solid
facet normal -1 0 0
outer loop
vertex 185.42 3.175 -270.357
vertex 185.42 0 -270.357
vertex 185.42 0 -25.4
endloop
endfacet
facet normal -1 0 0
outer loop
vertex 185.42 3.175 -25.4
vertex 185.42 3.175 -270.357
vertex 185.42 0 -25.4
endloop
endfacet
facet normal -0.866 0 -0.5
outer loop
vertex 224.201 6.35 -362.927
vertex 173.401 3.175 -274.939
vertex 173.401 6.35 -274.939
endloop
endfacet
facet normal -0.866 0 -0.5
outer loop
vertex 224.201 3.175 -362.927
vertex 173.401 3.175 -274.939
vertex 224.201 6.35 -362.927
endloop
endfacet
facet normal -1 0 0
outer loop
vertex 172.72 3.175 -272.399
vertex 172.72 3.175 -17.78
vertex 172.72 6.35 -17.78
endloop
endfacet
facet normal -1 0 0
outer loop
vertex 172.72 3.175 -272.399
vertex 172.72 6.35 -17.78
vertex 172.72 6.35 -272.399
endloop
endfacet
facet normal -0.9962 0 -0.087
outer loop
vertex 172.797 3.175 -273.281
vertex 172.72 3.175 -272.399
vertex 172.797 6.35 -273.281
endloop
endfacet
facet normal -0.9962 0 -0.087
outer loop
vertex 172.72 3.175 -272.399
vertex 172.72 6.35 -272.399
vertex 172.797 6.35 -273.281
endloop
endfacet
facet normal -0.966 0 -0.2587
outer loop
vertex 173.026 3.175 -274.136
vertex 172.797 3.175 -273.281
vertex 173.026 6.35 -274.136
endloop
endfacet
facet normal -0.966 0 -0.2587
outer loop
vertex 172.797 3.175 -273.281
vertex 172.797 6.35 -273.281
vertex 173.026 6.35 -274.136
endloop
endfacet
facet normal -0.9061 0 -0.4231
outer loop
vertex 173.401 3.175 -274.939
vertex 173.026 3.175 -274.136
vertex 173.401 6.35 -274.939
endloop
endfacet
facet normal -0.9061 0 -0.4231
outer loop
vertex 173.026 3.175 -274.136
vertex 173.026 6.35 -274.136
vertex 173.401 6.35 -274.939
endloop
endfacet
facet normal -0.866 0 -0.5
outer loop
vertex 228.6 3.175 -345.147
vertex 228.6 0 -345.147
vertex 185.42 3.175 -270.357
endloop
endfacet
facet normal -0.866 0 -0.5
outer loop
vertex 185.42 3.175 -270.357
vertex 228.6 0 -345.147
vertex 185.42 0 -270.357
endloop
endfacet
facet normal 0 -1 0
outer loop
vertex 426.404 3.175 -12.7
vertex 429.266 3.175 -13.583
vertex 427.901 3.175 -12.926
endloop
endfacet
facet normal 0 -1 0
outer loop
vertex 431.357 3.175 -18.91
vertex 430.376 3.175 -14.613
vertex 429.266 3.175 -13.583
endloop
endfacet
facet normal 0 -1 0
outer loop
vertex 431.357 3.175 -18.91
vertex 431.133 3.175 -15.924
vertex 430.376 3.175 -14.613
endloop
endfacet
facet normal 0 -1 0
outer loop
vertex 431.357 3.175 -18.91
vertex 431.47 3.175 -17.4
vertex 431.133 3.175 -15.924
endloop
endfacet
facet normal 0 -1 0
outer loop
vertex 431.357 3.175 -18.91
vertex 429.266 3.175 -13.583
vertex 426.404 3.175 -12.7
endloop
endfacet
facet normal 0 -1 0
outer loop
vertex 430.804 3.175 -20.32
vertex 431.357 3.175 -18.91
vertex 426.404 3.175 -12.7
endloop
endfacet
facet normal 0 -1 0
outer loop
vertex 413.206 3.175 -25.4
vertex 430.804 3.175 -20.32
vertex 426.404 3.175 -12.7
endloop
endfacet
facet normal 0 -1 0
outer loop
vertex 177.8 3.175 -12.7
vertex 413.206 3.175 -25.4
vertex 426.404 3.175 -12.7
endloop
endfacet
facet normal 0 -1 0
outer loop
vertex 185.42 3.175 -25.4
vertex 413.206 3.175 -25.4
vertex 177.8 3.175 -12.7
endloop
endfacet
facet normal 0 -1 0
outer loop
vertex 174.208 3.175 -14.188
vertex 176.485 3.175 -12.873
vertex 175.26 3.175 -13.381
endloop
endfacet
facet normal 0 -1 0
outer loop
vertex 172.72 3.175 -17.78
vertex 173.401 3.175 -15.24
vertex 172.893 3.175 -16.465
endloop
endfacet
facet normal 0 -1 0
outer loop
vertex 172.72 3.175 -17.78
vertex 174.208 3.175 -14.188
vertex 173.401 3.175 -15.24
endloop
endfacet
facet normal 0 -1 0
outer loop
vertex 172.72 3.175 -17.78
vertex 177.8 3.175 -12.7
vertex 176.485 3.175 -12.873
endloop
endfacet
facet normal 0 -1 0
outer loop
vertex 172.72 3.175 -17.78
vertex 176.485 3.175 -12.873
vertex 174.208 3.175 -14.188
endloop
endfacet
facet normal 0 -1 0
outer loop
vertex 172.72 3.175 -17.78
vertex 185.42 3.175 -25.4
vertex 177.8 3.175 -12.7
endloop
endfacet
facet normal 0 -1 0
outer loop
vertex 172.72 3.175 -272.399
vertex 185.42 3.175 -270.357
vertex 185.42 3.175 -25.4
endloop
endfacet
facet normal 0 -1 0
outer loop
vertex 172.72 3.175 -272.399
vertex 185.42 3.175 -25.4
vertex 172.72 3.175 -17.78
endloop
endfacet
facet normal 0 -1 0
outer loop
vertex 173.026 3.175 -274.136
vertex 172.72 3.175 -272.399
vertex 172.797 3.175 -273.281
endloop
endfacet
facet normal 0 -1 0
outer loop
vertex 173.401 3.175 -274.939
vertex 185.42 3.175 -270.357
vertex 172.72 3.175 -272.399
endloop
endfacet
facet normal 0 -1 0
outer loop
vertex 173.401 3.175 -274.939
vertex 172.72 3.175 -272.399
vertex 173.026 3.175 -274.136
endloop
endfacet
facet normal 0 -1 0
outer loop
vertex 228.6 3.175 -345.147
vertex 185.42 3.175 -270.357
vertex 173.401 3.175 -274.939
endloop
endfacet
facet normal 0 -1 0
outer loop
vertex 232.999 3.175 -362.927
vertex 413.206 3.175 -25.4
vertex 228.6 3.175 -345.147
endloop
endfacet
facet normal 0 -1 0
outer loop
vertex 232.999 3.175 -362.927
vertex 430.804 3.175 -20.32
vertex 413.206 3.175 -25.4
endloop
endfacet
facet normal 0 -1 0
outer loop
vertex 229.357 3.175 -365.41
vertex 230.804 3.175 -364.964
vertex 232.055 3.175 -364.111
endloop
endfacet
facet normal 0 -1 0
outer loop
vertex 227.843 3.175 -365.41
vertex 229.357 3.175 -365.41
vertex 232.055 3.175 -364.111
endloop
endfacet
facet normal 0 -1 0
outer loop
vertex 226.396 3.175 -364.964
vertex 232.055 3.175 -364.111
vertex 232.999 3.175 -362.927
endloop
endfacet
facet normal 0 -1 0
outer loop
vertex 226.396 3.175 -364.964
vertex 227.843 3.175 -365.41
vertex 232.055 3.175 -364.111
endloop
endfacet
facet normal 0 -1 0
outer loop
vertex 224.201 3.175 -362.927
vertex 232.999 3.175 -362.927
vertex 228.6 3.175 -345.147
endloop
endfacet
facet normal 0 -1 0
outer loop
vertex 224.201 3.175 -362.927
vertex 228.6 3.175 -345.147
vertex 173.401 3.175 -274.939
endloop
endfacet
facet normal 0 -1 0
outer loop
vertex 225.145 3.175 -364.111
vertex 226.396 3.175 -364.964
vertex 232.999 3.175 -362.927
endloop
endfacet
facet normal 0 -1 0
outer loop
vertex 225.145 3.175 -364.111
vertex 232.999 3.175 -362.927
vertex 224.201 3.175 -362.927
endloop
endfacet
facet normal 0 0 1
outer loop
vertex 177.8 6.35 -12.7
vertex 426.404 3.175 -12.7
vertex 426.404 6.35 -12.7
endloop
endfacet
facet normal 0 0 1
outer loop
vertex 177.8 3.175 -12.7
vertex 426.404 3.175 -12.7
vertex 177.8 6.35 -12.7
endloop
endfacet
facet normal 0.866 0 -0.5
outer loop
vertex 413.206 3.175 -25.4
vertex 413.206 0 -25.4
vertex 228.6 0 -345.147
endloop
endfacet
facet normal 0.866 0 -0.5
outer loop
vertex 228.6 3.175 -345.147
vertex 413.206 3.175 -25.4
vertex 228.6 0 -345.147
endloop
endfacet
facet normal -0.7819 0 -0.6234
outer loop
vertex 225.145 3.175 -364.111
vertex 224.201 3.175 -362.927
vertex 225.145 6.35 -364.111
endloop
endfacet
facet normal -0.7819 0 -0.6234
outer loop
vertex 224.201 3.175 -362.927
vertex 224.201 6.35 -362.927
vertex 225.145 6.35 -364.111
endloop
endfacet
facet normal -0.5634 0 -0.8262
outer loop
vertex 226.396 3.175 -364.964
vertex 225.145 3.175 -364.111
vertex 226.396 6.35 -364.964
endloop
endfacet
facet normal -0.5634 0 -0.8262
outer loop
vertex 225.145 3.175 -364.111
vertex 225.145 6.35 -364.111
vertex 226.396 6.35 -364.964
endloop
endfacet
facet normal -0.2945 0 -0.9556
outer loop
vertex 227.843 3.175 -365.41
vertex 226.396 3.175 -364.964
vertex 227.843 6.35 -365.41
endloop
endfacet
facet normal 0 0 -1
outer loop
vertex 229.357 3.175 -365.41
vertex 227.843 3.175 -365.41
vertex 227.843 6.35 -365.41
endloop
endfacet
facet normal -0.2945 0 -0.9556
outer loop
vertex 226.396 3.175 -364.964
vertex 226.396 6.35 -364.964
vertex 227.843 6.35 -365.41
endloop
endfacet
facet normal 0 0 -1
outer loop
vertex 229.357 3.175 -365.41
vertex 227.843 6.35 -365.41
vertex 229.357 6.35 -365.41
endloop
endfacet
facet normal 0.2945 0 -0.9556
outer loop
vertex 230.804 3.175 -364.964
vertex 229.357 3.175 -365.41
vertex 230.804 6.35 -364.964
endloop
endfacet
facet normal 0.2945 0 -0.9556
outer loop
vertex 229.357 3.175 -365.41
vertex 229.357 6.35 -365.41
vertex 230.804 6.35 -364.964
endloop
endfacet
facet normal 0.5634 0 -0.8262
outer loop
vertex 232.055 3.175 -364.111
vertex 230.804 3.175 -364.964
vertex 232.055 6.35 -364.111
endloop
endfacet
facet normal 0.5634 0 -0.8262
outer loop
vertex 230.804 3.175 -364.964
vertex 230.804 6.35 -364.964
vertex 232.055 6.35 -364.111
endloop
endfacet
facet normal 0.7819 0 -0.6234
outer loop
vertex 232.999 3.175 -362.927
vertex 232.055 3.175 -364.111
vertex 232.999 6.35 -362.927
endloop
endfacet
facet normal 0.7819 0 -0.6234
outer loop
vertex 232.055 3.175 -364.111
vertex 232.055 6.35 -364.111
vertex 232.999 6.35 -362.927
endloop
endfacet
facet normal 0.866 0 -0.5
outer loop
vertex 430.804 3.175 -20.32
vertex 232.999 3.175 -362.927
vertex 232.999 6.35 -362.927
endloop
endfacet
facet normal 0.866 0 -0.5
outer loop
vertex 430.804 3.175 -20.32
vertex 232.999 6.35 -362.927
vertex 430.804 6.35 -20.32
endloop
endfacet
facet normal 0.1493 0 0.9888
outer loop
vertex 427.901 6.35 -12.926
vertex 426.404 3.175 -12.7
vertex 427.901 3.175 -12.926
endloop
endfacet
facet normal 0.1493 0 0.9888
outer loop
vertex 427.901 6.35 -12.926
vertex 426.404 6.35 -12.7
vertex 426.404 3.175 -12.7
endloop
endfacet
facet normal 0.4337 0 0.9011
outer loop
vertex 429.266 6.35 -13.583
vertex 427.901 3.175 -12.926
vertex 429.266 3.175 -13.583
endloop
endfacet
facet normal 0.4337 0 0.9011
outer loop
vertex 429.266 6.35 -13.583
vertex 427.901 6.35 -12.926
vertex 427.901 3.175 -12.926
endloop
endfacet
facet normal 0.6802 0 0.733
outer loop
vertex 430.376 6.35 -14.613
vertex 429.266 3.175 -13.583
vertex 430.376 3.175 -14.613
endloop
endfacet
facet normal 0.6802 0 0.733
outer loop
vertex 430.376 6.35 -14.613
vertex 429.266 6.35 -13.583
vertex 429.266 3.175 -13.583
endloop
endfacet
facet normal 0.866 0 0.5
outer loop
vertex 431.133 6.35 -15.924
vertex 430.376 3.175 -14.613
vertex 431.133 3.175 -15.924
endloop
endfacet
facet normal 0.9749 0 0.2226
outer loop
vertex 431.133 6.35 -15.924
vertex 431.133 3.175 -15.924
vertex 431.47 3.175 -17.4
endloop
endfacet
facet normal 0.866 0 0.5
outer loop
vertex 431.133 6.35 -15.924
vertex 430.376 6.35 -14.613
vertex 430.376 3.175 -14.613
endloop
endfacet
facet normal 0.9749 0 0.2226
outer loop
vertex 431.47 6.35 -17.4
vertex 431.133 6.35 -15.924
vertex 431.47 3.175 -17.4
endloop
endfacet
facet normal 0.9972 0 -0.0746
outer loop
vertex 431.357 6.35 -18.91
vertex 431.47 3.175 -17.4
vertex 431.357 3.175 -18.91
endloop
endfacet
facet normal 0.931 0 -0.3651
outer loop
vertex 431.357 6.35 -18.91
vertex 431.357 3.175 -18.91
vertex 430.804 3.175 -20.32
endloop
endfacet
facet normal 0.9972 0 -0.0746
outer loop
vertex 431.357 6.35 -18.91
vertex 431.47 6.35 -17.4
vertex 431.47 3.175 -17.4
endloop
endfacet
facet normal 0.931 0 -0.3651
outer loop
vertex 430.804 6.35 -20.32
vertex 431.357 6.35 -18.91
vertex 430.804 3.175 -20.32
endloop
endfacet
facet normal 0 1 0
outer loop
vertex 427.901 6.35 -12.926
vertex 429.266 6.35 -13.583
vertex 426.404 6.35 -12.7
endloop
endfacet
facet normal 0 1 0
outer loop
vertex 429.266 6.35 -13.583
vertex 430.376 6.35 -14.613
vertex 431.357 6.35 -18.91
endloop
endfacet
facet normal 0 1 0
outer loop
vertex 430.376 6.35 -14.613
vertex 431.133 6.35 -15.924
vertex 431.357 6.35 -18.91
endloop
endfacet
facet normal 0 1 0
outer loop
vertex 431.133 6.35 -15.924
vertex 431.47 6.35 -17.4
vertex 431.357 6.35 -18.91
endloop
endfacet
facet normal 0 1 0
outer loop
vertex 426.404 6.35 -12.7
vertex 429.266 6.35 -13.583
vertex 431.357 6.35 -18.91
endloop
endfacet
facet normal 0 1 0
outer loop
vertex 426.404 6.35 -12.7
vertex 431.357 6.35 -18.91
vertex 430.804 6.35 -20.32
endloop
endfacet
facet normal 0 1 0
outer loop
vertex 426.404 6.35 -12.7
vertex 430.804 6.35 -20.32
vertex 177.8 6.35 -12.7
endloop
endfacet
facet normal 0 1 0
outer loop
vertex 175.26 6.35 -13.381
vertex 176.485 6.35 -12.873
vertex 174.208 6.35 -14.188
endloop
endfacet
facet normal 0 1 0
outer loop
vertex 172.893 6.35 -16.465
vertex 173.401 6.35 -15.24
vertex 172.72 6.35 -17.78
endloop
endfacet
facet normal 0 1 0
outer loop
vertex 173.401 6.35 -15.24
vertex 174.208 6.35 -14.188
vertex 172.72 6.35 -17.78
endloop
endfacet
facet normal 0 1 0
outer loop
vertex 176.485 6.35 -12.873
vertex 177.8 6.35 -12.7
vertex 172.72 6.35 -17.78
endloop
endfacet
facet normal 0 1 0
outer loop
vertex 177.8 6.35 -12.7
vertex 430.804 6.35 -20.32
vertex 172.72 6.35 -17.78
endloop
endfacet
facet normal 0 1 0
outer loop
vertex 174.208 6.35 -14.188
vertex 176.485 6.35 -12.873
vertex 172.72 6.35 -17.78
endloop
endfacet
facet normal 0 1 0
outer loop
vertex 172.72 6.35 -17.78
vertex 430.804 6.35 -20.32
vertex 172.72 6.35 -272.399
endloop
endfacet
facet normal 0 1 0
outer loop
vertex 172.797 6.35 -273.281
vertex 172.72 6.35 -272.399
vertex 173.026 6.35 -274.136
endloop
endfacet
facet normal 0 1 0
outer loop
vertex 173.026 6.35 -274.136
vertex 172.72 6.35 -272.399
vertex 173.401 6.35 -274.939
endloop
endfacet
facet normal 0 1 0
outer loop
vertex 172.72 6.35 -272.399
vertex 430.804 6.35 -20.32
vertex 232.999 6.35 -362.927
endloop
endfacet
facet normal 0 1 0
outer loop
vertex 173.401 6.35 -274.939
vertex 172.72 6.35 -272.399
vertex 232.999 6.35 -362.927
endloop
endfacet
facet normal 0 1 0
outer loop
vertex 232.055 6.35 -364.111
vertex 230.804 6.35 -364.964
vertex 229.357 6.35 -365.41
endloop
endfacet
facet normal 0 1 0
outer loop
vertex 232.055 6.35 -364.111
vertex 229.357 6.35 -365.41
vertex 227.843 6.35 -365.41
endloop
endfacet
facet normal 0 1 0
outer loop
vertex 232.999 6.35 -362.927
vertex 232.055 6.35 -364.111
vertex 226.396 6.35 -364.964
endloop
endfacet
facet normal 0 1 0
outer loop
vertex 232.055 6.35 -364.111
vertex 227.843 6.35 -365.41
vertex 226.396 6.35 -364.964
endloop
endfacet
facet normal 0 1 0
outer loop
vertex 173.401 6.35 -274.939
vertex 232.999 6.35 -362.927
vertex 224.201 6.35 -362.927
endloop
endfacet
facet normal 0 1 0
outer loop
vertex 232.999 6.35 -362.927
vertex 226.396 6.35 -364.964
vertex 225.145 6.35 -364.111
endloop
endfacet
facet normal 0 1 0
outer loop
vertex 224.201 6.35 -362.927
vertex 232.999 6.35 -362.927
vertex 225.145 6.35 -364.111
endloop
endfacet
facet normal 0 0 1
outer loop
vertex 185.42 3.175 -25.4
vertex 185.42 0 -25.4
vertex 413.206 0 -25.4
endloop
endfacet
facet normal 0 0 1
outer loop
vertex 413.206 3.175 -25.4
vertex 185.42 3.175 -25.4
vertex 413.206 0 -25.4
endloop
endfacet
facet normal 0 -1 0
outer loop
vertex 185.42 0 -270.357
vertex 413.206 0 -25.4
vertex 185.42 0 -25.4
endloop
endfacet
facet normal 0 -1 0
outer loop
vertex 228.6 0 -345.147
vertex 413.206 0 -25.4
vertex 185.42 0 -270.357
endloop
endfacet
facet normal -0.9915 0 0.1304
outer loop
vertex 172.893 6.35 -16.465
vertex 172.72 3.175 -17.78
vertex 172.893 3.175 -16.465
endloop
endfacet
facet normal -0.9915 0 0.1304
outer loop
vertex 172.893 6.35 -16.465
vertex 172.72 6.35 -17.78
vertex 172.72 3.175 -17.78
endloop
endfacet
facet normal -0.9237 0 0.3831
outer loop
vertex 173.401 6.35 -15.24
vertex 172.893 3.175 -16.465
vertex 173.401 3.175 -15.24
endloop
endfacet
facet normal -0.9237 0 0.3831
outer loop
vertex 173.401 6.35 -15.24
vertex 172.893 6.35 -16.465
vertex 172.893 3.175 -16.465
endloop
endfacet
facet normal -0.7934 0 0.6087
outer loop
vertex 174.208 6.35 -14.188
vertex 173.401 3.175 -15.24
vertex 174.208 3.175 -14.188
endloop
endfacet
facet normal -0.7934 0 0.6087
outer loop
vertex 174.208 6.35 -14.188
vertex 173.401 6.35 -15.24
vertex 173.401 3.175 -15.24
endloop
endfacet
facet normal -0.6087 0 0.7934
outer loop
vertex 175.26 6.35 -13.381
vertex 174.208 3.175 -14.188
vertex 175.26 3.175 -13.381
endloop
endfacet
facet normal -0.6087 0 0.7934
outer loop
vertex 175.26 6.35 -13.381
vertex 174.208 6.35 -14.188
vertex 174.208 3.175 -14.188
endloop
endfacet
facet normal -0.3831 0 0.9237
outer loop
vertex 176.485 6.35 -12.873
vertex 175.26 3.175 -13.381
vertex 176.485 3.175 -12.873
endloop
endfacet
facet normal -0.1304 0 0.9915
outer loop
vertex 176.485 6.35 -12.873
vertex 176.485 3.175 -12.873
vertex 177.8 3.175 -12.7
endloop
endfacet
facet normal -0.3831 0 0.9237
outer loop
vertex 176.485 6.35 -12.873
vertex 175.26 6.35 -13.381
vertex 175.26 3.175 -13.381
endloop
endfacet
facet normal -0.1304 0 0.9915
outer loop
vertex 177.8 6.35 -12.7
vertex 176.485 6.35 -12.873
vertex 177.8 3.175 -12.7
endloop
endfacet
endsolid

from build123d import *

# Parameters (mm, degrees)
BOSS_EXTRUDE1_DEPTH = 6.35
CUT_EXTRUDE2_DEPTH  = 3.175
FILLET1_R           = 5.08


with BuildPart() as part:
    # Sketch1 → Boss-Extrude1 (new body)
    with BuildSketch(Plane(origin=(0, 0, 0), x_dir=(1, 0, 0), z_dir=(0, 1, 0))):
        Polygon((172.72, 12.7), (435.202954744, 12.7), (228.6, 370.54681461), (172.72, 273.759815483), align=None)
    extrude(amount=BOSS_EXTRUDE1_DEPTH)

    # Sketch1<3> → Cut-Extrude2 (cut)
    with BuildSketch(Plane(origin=(0, 0, 0), x_dir=(1, 0, 0), z_dir=(0, 1, 0))):
        Polygon((172.72, 12.7), (435.202954744, 12.7), (228.6, 370.54681461), (172.72, 273.759815483), align=None)
        Polygon((413.205909488, 25.4), (185.42, 25.4), (185.42, 270.356860739), (228.6, 345.14681461), align=None, mode=Mode.SUBTRACT)
    extrude(amount=CUT_EXTRUDE2_DEPTH, mode=Mode.SUBTRACT)

    # Fillet1
    fillet1_edges = [part.edges().sort_by_distance(p)[0] for p in [
        (228.6, 4.7625, -370.54681461),
        (172.72, 4.7625, -273.759815483),
        (172.72, 4.7625, -12.7),
        (435.202954744, 4.7625, -12.7),
    ]]
    fillet(fillet1_edges, radius=FILLET1_R)


solid = part.part
